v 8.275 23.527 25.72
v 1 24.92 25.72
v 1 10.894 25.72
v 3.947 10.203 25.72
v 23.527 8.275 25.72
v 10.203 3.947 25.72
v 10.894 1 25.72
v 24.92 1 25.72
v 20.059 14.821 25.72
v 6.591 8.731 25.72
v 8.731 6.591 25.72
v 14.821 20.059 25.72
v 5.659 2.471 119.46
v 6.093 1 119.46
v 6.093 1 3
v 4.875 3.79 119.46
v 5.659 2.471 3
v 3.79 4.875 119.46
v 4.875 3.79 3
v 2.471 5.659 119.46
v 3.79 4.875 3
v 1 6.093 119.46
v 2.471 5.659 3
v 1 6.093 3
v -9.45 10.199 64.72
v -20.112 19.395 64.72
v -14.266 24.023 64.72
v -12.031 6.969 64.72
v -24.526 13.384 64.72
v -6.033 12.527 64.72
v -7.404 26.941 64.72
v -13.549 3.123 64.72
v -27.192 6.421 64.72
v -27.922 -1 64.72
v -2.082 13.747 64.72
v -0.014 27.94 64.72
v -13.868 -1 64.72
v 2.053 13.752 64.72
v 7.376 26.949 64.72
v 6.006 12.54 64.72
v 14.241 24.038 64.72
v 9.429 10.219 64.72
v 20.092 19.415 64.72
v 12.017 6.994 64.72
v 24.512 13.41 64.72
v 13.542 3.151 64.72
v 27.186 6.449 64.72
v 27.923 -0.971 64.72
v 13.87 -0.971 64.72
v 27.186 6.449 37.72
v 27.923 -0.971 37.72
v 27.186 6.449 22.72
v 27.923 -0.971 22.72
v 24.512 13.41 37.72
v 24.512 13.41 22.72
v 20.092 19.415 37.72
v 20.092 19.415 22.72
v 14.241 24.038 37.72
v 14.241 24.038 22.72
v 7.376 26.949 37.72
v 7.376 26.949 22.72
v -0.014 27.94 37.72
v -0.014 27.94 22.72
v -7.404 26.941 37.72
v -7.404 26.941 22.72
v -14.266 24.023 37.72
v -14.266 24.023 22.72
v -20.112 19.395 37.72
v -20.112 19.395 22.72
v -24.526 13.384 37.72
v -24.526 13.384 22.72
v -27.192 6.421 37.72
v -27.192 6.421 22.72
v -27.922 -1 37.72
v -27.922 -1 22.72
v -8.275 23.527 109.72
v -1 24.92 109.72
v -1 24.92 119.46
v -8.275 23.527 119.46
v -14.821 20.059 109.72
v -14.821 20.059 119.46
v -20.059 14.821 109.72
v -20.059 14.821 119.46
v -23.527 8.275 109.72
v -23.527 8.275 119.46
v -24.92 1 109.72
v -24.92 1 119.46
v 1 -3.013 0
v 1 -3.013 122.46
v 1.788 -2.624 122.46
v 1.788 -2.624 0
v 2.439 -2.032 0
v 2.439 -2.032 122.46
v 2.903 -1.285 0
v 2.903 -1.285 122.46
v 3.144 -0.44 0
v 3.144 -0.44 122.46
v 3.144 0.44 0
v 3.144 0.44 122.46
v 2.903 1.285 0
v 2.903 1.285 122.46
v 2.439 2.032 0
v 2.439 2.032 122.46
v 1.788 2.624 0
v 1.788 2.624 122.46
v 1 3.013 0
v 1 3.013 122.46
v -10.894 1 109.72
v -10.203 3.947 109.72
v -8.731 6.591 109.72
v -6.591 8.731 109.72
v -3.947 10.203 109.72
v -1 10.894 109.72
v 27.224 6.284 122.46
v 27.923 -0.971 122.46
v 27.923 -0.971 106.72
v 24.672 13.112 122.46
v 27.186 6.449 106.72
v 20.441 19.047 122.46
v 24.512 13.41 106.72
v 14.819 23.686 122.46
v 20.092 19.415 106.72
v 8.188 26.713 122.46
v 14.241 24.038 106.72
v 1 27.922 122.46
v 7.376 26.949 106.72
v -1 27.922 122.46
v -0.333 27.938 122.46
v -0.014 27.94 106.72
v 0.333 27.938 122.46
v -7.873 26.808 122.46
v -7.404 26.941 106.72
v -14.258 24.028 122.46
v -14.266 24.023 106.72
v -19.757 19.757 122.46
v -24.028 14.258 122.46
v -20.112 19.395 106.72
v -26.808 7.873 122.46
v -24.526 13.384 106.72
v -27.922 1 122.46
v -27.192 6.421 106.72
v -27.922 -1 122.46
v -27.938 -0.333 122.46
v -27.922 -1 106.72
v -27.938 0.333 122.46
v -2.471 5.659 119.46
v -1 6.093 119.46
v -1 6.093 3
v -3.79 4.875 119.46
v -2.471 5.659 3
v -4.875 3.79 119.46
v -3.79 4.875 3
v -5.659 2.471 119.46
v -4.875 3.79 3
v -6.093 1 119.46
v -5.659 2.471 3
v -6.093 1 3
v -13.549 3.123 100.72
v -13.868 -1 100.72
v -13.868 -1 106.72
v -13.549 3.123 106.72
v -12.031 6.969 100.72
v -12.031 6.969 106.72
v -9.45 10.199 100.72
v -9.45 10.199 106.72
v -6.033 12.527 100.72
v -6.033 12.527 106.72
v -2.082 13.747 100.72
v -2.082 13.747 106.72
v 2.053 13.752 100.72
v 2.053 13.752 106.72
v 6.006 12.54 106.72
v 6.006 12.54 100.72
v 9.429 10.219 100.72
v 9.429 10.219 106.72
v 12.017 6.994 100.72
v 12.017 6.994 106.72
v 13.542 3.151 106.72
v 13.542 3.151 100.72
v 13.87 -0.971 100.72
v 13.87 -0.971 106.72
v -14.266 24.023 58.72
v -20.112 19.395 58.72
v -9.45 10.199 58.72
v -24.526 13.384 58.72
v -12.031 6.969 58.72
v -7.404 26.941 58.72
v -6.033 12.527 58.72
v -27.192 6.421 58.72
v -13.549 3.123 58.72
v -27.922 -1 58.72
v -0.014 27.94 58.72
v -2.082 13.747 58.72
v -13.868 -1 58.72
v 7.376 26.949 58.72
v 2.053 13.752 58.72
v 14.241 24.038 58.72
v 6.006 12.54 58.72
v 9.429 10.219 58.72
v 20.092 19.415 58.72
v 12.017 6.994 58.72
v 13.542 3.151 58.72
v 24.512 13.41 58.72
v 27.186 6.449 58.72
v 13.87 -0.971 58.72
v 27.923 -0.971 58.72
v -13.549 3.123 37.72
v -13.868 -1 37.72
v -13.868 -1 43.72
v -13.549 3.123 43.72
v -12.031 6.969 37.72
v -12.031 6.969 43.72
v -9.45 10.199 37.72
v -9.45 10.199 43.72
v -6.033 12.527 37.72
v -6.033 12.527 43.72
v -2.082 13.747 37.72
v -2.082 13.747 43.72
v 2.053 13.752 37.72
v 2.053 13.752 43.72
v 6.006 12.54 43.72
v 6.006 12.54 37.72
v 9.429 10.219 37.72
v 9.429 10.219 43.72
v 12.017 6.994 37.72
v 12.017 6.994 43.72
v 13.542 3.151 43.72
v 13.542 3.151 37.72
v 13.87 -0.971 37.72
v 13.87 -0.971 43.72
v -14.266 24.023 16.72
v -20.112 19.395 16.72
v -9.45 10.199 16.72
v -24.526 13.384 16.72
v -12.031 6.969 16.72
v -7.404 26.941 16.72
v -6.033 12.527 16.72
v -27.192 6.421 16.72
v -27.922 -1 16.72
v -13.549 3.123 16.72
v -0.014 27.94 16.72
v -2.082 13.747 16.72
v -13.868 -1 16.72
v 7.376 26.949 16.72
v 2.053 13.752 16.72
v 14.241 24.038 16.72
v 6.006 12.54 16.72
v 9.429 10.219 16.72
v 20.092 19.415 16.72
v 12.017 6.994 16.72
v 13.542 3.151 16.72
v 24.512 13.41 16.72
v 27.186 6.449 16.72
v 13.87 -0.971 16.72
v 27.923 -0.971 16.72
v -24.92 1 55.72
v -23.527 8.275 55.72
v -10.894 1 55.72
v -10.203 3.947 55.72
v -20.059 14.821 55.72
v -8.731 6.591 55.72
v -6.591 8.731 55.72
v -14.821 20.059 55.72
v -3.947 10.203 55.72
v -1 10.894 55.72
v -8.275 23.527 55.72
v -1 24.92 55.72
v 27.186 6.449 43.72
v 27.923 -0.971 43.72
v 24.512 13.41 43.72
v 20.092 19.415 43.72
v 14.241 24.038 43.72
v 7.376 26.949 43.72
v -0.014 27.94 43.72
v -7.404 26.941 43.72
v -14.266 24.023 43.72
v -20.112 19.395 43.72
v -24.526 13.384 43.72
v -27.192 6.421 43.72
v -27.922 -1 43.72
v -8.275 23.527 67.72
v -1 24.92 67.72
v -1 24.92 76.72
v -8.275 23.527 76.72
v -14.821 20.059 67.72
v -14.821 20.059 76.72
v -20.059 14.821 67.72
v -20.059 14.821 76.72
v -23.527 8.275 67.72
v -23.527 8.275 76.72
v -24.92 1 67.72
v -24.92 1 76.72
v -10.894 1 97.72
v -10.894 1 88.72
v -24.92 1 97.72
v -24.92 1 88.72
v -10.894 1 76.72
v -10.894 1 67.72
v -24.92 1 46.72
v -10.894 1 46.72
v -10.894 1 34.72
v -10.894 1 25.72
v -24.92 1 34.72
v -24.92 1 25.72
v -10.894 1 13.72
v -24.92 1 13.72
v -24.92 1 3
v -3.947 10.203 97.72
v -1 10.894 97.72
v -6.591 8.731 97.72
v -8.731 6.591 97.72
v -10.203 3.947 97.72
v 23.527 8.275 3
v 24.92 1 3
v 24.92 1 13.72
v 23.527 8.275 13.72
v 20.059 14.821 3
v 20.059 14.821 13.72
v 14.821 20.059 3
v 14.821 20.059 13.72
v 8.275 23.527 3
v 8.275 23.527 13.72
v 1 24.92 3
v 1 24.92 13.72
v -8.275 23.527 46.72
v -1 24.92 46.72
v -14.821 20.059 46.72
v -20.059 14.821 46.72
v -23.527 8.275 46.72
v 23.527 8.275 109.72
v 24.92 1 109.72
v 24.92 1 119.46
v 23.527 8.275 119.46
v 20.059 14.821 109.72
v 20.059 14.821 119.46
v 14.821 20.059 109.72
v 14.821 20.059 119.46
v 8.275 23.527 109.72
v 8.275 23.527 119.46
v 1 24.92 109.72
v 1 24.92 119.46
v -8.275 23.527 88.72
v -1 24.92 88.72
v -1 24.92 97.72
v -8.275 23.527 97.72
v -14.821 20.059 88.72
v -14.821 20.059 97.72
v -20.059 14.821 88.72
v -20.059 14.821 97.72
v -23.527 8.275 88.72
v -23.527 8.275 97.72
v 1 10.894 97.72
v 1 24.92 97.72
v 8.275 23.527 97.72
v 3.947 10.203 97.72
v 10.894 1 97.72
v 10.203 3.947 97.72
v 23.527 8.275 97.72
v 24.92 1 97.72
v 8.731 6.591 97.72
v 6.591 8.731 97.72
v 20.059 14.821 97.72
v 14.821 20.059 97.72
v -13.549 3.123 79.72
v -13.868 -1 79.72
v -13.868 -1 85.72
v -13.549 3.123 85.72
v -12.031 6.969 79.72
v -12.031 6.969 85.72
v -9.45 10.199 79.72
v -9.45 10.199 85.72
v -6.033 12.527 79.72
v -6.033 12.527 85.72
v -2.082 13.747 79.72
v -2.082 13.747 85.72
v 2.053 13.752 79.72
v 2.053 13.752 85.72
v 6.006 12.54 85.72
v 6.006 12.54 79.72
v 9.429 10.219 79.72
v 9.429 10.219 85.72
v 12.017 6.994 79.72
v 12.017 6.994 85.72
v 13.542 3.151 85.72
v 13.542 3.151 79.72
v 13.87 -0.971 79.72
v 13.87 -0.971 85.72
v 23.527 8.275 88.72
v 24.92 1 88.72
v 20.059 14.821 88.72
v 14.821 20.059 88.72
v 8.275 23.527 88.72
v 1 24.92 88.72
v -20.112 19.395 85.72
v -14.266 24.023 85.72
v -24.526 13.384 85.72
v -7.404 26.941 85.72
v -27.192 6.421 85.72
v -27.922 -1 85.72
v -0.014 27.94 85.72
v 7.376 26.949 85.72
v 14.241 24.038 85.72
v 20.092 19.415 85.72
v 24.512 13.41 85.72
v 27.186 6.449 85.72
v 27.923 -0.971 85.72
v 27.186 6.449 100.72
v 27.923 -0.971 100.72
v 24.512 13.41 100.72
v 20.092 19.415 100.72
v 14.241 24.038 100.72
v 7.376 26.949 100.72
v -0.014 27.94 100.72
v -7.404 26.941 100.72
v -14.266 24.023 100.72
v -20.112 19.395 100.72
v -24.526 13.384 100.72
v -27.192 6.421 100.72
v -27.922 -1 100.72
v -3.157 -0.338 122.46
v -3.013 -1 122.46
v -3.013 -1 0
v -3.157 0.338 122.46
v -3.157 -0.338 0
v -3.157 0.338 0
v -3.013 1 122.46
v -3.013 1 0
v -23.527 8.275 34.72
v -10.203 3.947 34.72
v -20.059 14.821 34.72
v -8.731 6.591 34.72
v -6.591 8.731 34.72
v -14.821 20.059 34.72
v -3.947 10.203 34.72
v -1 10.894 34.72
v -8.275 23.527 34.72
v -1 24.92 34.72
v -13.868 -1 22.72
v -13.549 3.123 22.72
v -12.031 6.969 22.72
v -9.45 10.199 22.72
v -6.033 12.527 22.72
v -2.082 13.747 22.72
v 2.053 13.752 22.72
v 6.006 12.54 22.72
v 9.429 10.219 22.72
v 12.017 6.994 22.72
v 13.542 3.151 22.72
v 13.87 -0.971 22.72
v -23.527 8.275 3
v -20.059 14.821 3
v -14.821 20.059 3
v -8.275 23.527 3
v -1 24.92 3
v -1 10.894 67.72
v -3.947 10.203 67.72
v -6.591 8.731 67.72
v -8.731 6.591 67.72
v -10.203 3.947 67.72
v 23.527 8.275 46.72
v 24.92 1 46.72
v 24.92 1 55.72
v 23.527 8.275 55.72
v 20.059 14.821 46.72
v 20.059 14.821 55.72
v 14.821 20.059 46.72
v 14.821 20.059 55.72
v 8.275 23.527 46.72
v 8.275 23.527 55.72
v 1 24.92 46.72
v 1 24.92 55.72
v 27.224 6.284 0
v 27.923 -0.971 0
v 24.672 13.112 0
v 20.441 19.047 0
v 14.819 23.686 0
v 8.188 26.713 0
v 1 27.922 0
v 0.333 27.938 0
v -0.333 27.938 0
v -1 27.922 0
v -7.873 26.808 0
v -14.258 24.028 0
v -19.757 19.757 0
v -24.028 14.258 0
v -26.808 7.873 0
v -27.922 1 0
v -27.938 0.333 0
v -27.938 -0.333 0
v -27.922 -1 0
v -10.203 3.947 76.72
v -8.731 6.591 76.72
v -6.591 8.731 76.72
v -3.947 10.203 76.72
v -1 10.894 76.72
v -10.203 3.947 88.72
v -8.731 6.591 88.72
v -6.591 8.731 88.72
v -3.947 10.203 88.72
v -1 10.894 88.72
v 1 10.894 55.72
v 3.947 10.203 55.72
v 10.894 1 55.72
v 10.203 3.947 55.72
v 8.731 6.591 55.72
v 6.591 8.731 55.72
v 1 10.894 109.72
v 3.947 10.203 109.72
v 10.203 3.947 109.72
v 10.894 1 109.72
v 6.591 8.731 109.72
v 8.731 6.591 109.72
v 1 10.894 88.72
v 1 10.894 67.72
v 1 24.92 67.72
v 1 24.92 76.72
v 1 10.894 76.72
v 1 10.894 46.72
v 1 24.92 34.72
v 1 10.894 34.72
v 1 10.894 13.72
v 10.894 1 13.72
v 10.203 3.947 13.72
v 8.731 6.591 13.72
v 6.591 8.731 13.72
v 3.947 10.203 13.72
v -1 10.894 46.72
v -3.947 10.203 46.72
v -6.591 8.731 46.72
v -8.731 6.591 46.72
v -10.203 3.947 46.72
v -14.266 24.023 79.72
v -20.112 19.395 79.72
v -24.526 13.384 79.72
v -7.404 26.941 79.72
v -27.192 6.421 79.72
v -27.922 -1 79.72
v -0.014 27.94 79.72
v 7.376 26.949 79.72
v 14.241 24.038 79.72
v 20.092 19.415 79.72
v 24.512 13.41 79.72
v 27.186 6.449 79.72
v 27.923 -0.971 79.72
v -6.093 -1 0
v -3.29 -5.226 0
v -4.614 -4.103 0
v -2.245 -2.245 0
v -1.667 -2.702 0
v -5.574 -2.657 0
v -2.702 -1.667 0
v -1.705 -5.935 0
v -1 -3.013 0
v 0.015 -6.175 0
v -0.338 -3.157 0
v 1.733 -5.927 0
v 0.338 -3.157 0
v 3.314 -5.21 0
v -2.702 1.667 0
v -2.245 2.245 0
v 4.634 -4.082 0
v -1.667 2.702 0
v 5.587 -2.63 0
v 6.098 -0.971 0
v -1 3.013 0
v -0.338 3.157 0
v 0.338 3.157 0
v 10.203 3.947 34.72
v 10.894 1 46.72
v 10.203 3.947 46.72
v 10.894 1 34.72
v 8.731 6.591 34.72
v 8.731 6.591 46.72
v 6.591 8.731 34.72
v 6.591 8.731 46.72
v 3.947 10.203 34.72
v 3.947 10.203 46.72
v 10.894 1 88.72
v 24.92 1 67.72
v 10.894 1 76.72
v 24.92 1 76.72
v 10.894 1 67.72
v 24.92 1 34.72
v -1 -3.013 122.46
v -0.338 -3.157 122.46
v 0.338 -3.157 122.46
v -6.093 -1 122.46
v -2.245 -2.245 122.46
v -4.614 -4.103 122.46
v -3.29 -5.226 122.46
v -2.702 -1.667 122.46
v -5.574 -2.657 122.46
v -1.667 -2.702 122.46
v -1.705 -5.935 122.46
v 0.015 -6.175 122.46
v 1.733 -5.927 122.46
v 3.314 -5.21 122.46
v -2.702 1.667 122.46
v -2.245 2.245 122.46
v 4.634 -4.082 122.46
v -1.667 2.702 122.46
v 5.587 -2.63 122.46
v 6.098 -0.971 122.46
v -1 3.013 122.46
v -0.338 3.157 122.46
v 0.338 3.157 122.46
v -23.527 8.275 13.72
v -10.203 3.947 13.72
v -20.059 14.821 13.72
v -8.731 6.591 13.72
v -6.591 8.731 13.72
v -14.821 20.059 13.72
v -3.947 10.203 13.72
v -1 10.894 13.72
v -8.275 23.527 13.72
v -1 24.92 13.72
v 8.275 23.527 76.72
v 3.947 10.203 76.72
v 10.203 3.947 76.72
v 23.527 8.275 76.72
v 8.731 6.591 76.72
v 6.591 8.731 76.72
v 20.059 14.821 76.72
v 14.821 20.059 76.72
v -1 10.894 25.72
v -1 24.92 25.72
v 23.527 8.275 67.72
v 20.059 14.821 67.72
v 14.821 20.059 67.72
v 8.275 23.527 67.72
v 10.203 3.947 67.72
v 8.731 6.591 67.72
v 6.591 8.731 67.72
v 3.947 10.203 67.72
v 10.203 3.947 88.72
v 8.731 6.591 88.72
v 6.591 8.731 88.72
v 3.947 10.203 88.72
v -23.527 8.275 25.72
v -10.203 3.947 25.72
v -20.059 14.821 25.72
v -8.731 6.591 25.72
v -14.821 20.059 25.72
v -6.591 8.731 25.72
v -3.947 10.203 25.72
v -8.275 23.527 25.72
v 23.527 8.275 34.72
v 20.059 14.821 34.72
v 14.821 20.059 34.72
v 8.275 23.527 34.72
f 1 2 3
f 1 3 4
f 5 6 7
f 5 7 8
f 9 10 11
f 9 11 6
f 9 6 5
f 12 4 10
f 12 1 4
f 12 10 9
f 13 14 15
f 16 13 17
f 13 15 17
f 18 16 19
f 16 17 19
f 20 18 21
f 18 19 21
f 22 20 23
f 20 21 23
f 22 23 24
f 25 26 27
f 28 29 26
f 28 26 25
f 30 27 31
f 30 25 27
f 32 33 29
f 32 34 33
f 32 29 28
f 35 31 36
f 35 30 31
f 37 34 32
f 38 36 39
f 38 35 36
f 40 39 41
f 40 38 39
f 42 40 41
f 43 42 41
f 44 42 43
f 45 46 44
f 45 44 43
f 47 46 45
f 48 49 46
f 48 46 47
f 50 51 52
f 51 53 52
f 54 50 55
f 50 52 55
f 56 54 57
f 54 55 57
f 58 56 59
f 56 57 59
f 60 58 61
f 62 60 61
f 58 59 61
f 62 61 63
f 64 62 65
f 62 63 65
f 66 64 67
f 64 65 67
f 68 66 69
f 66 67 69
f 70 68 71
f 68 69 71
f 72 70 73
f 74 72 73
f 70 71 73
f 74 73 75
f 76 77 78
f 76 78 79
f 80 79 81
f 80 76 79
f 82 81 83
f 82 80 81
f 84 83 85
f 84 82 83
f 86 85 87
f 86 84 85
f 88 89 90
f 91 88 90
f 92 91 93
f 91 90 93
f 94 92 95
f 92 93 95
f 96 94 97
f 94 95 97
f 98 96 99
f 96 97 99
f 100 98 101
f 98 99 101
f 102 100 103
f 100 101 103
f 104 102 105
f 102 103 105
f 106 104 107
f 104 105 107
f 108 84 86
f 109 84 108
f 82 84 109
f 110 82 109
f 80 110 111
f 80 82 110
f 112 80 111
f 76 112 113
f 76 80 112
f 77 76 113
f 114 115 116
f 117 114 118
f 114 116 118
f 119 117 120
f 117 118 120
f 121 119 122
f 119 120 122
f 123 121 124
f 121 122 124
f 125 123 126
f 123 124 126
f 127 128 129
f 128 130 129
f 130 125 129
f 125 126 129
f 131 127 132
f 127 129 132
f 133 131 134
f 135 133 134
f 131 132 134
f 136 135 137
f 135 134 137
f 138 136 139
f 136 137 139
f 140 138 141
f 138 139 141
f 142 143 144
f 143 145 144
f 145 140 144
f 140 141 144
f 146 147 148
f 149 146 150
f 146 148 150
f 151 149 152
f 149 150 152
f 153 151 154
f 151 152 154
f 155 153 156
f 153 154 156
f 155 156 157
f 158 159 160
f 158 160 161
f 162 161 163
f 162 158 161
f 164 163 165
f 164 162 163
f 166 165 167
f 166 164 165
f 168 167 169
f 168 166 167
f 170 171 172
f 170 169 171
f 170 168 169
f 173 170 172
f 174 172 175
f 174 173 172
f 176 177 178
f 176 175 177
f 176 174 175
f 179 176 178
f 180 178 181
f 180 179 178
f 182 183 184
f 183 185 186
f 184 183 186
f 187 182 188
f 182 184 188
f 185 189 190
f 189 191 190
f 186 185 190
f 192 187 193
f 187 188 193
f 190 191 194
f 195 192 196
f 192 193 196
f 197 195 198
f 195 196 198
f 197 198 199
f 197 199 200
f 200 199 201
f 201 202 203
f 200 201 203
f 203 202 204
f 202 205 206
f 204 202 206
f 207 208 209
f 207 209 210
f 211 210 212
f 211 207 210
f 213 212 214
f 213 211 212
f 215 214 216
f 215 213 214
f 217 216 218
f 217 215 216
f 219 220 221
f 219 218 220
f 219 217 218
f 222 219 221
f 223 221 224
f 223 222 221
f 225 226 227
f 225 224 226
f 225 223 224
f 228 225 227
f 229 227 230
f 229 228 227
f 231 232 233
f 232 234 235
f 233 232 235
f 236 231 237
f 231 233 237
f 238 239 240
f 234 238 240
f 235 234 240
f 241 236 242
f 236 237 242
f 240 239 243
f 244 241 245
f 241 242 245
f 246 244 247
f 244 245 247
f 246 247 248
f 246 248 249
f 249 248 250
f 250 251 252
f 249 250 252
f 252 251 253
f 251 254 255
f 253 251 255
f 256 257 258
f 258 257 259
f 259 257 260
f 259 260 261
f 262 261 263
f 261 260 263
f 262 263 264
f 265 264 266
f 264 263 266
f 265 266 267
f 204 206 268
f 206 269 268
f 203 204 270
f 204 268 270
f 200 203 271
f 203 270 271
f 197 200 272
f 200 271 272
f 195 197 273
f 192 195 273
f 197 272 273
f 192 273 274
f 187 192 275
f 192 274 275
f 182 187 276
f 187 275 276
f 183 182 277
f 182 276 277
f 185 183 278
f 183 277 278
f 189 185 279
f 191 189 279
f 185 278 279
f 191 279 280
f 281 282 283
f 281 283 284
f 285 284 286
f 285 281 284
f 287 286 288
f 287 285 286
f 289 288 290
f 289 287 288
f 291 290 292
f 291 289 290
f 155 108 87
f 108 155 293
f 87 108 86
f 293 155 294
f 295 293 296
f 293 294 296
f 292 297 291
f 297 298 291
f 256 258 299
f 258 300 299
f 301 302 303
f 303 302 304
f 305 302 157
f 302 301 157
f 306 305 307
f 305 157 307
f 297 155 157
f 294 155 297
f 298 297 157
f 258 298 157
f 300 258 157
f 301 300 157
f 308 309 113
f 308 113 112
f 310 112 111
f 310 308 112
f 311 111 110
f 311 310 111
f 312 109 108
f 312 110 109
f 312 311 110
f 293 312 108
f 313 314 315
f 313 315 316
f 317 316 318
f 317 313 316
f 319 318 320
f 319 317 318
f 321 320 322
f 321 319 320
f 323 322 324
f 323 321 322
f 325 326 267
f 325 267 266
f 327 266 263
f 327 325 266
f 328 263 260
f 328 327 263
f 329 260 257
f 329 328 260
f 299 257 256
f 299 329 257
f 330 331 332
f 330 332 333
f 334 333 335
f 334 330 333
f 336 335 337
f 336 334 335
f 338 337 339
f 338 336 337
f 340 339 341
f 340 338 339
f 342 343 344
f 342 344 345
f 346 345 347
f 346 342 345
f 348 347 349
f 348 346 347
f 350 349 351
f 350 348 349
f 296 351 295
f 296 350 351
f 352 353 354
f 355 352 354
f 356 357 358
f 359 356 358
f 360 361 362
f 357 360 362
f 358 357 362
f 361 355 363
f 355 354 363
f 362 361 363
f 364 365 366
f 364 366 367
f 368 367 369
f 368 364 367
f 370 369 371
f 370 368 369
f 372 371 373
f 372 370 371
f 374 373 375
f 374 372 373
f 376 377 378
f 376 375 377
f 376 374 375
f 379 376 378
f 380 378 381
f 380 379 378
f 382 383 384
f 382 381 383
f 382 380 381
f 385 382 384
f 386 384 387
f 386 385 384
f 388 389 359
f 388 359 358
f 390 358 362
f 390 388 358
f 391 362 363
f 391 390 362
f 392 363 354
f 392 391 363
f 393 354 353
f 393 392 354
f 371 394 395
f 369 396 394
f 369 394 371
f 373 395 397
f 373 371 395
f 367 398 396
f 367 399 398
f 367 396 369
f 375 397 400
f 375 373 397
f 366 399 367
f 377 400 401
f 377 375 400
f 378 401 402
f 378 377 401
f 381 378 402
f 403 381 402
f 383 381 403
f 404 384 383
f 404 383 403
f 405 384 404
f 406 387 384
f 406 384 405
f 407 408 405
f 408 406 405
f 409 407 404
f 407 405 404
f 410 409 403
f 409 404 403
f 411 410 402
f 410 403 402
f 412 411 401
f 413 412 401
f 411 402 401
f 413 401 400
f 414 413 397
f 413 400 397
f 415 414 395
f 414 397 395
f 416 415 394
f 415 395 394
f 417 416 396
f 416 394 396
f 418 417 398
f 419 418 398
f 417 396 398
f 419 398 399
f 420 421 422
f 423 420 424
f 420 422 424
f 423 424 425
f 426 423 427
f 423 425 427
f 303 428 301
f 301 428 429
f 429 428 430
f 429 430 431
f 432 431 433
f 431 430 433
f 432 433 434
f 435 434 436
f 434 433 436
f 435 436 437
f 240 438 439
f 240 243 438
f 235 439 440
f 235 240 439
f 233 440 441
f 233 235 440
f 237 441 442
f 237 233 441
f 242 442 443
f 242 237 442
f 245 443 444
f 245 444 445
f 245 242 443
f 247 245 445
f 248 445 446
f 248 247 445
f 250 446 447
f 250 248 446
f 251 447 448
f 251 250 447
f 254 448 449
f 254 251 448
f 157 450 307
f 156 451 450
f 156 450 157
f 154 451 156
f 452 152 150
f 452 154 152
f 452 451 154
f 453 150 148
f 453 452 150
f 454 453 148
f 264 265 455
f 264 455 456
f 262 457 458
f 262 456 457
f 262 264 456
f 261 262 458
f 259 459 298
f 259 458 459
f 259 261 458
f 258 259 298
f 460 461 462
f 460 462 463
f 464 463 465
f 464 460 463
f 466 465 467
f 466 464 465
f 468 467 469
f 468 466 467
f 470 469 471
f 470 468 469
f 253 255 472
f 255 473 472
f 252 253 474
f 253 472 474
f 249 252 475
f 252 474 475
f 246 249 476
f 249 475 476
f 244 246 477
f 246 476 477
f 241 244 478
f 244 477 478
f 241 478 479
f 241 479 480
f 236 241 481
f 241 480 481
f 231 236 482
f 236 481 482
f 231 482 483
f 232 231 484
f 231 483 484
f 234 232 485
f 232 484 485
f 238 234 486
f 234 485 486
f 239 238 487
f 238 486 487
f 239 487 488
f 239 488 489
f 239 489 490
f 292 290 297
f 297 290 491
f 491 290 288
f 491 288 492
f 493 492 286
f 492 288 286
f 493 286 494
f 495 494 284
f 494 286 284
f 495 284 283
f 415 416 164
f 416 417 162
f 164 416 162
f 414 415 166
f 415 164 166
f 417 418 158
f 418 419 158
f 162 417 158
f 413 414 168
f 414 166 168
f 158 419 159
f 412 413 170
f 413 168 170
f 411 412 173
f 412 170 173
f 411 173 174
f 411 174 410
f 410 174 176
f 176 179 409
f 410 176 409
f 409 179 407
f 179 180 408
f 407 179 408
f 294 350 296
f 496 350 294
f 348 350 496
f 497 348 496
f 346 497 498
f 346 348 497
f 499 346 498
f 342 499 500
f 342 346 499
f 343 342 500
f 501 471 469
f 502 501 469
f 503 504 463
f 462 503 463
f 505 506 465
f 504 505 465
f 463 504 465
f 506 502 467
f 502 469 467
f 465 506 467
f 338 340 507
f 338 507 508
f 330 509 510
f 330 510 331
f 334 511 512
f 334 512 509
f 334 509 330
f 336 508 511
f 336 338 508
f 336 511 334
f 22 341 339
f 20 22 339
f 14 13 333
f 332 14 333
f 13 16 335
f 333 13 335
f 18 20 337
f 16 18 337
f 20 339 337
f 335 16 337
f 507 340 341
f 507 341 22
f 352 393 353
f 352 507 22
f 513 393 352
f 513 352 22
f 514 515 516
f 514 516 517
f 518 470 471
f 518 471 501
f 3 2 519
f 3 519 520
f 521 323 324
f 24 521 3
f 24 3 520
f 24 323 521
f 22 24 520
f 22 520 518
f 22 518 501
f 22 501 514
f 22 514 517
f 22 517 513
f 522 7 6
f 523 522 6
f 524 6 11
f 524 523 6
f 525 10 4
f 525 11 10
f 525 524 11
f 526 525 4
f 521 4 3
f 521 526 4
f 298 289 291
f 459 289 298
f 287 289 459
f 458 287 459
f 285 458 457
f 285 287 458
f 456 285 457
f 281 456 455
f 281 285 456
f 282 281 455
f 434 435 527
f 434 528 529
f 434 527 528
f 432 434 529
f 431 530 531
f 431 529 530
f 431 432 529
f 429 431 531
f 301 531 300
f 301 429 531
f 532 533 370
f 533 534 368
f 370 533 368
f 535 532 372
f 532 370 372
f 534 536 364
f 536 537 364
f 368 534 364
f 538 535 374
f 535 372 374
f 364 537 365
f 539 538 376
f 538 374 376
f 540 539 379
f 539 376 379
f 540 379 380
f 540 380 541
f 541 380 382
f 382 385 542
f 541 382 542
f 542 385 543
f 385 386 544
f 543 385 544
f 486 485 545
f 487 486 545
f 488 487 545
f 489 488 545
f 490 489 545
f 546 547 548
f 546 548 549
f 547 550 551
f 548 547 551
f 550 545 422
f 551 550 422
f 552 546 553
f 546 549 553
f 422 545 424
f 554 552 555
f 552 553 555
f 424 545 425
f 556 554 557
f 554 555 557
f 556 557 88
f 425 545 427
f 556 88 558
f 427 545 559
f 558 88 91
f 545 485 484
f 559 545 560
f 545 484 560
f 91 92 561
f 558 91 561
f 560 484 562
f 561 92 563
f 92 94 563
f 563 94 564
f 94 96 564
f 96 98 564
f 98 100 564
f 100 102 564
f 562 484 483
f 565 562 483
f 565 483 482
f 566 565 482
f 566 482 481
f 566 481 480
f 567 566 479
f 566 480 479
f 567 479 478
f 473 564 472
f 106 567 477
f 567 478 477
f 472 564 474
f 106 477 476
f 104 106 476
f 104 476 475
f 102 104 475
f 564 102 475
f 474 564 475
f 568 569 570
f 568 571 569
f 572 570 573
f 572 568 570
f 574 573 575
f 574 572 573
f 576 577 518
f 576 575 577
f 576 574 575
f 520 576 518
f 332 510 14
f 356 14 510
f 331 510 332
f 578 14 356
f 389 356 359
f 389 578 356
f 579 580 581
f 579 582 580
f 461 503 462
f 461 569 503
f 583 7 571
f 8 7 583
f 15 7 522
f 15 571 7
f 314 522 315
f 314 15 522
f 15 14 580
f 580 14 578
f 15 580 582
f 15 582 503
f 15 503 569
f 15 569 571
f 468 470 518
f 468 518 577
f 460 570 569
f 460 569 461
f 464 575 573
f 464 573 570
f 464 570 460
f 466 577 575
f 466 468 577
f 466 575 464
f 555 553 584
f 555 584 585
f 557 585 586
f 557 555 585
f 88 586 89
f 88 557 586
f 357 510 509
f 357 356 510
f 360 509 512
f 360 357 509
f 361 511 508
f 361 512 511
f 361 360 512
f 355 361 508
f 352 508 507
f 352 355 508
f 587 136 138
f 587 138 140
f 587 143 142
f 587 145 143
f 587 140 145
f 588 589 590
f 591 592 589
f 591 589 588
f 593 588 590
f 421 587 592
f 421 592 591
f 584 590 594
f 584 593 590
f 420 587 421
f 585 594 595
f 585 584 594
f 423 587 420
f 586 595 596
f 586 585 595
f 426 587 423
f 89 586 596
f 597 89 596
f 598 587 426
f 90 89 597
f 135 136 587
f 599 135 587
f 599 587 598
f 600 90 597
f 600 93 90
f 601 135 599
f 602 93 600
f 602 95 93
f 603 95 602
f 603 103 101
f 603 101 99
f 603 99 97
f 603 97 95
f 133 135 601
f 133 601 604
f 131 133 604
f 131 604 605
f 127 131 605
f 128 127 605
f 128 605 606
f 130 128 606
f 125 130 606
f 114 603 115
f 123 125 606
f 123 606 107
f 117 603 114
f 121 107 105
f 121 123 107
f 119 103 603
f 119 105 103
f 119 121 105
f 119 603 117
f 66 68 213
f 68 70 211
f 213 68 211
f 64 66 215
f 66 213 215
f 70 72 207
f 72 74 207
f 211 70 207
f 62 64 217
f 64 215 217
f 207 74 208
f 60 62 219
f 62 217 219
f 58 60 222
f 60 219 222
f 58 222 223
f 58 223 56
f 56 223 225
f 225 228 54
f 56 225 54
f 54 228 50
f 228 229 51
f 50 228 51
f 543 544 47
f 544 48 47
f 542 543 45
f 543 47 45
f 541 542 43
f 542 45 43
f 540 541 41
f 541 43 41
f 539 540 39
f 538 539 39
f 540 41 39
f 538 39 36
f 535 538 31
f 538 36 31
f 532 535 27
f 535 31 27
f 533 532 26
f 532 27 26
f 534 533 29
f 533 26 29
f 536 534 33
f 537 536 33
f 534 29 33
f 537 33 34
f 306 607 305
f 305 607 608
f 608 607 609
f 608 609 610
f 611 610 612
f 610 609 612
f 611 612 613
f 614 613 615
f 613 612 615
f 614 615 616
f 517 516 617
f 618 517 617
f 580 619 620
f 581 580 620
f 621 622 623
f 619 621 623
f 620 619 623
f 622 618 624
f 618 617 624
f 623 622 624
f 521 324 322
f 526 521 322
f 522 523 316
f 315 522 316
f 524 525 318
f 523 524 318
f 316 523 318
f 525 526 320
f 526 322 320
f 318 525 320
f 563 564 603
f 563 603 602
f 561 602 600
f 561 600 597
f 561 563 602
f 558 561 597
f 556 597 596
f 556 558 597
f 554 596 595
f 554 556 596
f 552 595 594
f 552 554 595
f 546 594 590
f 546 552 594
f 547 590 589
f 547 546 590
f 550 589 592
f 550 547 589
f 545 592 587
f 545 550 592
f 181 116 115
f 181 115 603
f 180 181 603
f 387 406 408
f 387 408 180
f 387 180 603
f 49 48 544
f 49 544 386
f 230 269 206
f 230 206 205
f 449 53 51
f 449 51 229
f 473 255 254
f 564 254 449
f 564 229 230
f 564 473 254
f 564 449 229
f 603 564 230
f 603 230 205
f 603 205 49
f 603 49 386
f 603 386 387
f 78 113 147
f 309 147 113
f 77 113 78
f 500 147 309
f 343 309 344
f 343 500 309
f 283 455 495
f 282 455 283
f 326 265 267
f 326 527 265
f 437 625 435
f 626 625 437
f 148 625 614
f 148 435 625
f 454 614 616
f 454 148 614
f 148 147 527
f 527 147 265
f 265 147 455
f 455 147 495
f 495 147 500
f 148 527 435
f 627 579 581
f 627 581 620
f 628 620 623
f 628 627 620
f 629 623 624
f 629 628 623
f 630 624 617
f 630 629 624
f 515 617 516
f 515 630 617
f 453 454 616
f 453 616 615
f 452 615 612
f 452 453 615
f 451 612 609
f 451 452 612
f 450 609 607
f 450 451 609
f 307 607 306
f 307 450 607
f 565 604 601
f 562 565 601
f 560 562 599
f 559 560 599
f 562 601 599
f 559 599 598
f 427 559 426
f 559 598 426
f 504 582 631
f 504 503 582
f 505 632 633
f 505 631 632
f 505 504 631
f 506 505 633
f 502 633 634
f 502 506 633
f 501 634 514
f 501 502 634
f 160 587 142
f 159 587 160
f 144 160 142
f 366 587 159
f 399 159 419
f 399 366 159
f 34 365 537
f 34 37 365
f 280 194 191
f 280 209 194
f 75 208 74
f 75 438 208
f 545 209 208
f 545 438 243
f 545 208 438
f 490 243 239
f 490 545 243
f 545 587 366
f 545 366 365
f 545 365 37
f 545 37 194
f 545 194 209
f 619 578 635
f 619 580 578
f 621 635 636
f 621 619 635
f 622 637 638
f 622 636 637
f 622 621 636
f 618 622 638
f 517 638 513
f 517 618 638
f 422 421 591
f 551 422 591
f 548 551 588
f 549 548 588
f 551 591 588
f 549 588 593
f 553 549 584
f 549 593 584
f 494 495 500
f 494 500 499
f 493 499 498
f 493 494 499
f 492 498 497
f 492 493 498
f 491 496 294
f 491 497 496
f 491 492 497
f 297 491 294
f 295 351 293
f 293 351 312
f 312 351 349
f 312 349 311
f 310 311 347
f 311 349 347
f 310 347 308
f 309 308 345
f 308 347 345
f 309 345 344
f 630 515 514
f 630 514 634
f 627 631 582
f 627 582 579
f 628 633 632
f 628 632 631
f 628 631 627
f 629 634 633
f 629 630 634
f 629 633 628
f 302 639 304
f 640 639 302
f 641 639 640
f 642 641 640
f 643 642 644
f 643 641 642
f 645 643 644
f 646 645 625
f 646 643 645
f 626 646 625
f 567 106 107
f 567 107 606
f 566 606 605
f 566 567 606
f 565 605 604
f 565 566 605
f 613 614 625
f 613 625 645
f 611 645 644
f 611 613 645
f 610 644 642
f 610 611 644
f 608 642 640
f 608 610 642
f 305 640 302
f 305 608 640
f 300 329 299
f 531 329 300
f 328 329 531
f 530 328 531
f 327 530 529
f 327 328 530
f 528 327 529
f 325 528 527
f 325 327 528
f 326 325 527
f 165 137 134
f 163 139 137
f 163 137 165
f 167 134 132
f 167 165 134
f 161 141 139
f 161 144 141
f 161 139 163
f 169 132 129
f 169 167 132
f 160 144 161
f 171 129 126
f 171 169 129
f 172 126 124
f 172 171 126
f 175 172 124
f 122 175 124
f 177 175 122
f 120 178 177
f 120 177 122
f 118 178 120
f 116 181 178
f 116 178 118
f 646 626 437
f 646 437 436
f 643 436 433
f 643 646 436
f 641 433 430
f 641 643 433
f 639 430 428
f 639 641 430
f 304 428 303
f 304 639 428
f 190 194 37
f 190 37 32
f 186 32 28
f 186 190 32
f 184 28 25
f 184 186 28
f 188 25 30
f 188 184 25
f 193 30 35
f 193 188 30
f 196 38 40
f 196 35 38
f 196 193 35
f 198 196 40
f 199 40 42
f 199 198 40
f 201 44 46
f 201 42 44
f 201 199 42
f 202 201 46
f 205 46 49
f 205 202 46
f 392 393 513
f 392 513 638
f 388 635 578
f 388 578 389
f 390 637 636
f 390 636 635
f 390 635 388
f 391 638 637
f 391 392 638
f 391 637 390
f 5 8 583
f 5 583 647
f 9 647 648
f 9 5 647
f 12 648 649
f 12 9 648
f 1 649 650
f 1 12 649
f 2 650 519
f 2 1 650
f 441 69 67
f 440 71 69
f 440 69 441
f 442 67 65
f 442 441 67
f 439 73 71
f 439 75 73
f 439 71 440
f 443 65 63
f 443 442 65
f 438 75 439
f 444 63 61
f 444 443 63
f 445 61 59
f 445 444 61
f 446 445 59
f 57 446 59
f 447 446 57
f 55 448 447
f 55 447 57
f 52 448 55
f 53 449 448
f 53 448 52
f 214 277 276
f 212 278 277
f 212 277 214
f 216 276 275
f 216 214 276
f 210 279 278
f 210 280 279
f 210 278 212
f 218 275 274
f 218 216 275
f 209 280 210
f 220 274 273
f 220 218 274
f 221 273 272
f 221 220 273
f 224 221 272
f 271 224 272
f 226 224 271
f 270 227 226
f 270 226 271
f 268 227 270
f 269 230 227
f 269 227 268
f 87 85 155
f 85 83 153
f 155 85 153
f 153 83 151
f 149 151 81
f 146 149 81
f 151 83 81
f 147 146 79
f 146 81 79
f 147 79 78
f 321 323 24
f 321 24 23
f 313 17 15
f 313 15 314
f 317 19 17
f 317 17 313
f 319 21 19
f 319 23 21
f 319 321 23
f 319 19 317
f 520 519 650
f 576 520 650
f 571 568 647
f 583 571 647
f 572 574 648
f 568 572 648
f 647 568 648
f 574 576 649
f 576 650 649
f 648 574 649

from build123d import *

# Parameters (mm, degrees)
SKETCH3_R            = 27.94
BOSS_EXTRUDE2_DEPTH  = 122.46
SKETCH5_R            = 3.175
CUT_EXTRUDE1_DEPTH   = 129.676877488
SKETCH4_W            = 14
SKETCH4_H            = 6
SHELL1_START         = 3
SHELL1_OUTLINE_R     = 10.94
SHELL1_OUTLINE_R_2   = 6.175
SHELL1_DEPTH         = 116.46
SHELL1_2_OUTLINE_R   = 24.94
SHELL1_2_OUTLINE_R_2 = 10.94
SHELL1_2_DEPTH       = 10.72
SHELL1_START_2       = 109.72
SHELL1_3_OUTLINE_R   = 24.94
SHELL1_3_OUTLINE_R_2 = 10.94
SHELL1_3_DEPTH       = 9.74
SHELL1_START_3       = 25.72
SHELL1_4_OUTLINE_R   = 24.94
SHELL1_4_OUTLINE_R_2 = 10.94
SHELL1_4_DEPTH       = 9
SHELL1_START_4       = 46.72
SHELL1_5_OUTLINE_R   = 24.94
SHELL1_5_OUTLINE_R_2 = 10.94
SHELL1_5_DEPTH       = 9
SHELL1_START_5       = 67.72
SHELL1_6_OUTLINE_R   = 24.94
SHELL1_6_OUTLINE_R_2 = 10.94
SHELL1_6_DEPTH       = 9
SHELL1_START_6       = 88.72
SHELL1_7_OUTLINE_R   = 24.94
SHELL1_7_OUTLINE_R_2 = 10.94
SHELL1_7_DEPTH       = 9
BOSS_EXTRUDE3_REACH  = 130.677
SKETCH13_W           = 16.483162312
SKETCH13_H           = 6
CUT_EXTRUDE3_DEPTH   = 123


# Read off the part's stored shape, not the designer's step: Shell1
with BuildPart() as part:
    # Sketch3 → Boss-Extrude2 (new body)
    with BuildSketch(Plane.XY):
        Circle(SKETCH3_R)
    extrude(amount=BOSS_EXTRUDE2_DEPTH)

    # Sketch5 → Cut-Extrude1 (cut, through all)
    with BuildSketch(Plane.XY.offset(122.46)):
        Circle(SKETCH5_R)
    extrude(amount=-CUT_EXTRUDE1_DEPTH, mode=Mode.SUBTRACT)

    # Sketch4 → Cut-Revolve1 (revolve, cut)
    with BuildSketch(Plane(origin=(0, 0, 0), x_dir=(1, 0, 0), z_dir=(0, 1, 0)), mode=Mode.PRIVATE) as cut_revolve1_sk:
        with Locations((-20.94, -103.72)):
            Rectangle(SKETCH4_W, SKETCH4_H)
        with Locations((-20.94, -82.72)):
            Rectangle(SKETCH4_W, SKETCH4_H)
        with Locations((-20.94, -61.72)):
            Rectangle(SKETCH4_W, SKETCH4_H)
        with Locations((-20.94, -40.72)):
            Rectangle(SKETCH4_W, SKETCH4_H)
        with Locations((-20.94, -19.72)):
            Rectangle(SKETCH4_W, SKETCH4_H)
    revolve(cut_revolve1_sk.sketch.rotate(Axis((0, 0, 122.46), (0, 0, -1)), 180), axis=Axis((0, 0, 122.46), (0, 0, -1)), mode=Mode.SUBTRACT)

    # Shell1 outline → Shell1 (cut)
    with BuildSketch(Plane.XY.offset(SHELL1_START)):
        Circle(SHELL1_OUTLINE_R)
        Circle(SHELL1_OUTLINE_R_2, mode=Mode.SUBTRACT)
    extrude(amount=SHELL1_DEPTH, mode=Mode.SUBTRACT)

    # Shell1 2 outline → Shell1 2 (cut)
    with BuildSketch(Plane.XY.offset(SHELL1_START)):
        Circle(SHELL1_2_OUTLINE_R)
        Circle(SHELL1_2_OUTLINE_R_2, mode=Mode.SUBTRACT)
    extrude(amount=SHELL1_2_DEPTH, mode=Mode.SUBTRACT)

    # Shell1 3 outline → Shell1 3 (cut)
    with BuildSketch(Plane.XY.offset(SHELL1_START_2)):
        Circle(SHELL1_3_OUTLINE_R)
        Circle(SHELL1_3_OUTLINE_R_2, mode=Mode.SUBTRACT)
    extrude(amount=SHELL1_3_DEPTH, mode=Mode.SUBTRACT)

    # Shell1 4 outline → Shell1 4 (cut)
    with BuildSketch(Plane.XY.offset(SHELL1_START_3)):
        Circle(SHELL1_4_OUTLINE_R)
        Circle(SHELL1_4_OUTLINE_R_2, mode=Mode.SUBTRACT)
    extrude(amount=SHELL1_4_DEPTH, mode=Mode.SUBTRACT)

    # Shell1 5 outline → Shell1 5 (cut)
    with BuildSketch(Plane.XY.offset(SHELL1_START_4)):
        Circle(SHELL1_5_OUTLINE_R)
        Circle(SHELL1_5_OUTLINE_R_2, mode=Mode.SUBTRACT)
    extrude(amount=SHELL1_5_DEPTH, mode=Mode.SUBTRACT)

    # Shell1 6 outline → Shell1 6 (cut)
    with BuildSketch(Plane.XY.offset(SHELL1_START_5)):
        Circle(SHELL1_6_OUTLINE_R)
        Circle(SHELL1_6_OUTLINE_R_2, mode=Mode.SUBTRACT)
    extrude(amount=SHELL1_6_DEPTH, mode=Mode.SUBTRACT)

    # Shell1 7 outline → Shell1 7 (cut)
    with BuildSketch(Plane.XY.offset(SHELL1_START_6)):
        Circle(SHELL1_7_OUTLINE_R)
        Circle(SHELL1_7_OUTLINE_R_2, mode=Mode.SUBTRACT)
    extrude(amount=SHELL1_7_DEPTH, mode=Mode.SUBTRACT)

    # Boss-Extrude3: up to this face of the body (flat: up to its plane)
    boss_extrude3_end = Plane(part.part.faces().sort_by_distance((-27.149737461, 0, 122.46))[0])
    # Sketch10 → Boss-Extrude3 (add, up to the picked face)
    with BuildSketch(Plane(origin=(0, 0, 0), x_dir=(-1, 0, 0), z_dir=(0, 0, -1)), mode=Mode.PRIVATE) as boss_extrude3_sk1:
        with BuildLine():
            Line((-1, 27.922098775), (-1, 3.01340754))
            ThreePointArc((-1, 3.01340754), (0, 3.175), (1, 3.01340754))
            Line((1, 3.01340754), (1, 27.922098775))
            ThreePointArc((1, 27.922098775), (0, 27.94), (-1, 27.922098775))
        make_face()
    boss_extrude3_tool1 = split(extrude(boss_extrude3_sk1.sketch, amount=-BOSS_EXTRUDE3_REACH, mode=Mode.PRIVATE), bisect_by=boss_extrude3_end, keep=Keep.BOTH, mode=Mode.PRIVATE)
    # Sketch10 → Boss-Extrude3 (add, up to the picked face)
    with BuildSketch(Plane(origin=(0, 0, 0), x_dir=(-1, 0, 0), z_dir=(0, 0, -1)), mode=Mode.PRIVATE) as boss_extrude3_sk2:
        with BuildLine():
            Line((3.01340754, 1), (27.922098775, 1))
            ThreePointArc((27.922098775, 1), (27.94, 0), (27.922098775, -1))
            Line((27.922098775, -1), (3.01340754, -1))
            ThreePointArc((3.01340754, -1), (3.175, 0), (3.01340754, 1))
        make_face()
    boss_extrude3_tool2 = split(extrude(boss_extrude3_sk2.sketch, amount=-BOSS_EXTRUDE3_REACH, mode=Mode.PRIVATE), bisect_by=boss_extrude3_end, keep=Keep.BOTH, mode=Mode.PRIVATE)
    # Sketch10 → Boss-Extrude3 (add, up to the picked face)
    with BuildSketch(Plane(origin=(0, 0, 0), x_dir=(-1, 0, 0), z_dir=(0, 0, -1)), mode=Mode.PRIVATE) as boss_extrude3_sk3:
        with BuildLine():
            Line((-1, -3.01340754), (-1, -27.922098775))
            ThreePointArc((-1, -27.922098775), (0, -27.94), (1, -27.922098775))
            Line((1, -27.922098775), (1, -3.01340754))
            ThreePointArc((1, -3.01340754), (0, -3.175), (-1, -3.01340754))
        make_face()
    boss_extrude3_tool3 = split(extrude(boss_extrude3_sk3.sketch, amount=-BOSS_EXTRUDE3_REACH, mode=Mode.PRIVATE), bisect_by=boss_extrude3_end, keep=Keep.BOTH, mode=Mode.PRIVATE)
    # Sketch10 → Boss-Extrude3 (add, up to the picked face)
    with BuildSketch(Plane(origin=(0, 0, 0), x_dir=(-1, 0, 0), z_dir=(0, 0, -1)), mode=Mode.PRIVATE) as boss_extrude3_sk4:
        with BuildLine():
            Line((-27.922098775, -1), (-3.01340754, -1))
            ThreePointArc((-3.01340754, -1), (-3.175, 0), (-3.01340754, 1))
            Line((-3.01340754, 1), (-27.922098775, 1))
            ThreePointArc((-27.922098775, 1), (-27.94, 0), (-27.922098775, -1))
        make_face()
    boss_extrude3_tool4 = split(extrude(boss_extrude3_sk4.sketch, amount=-BOSS_EXTRUDE3_REACH, mode=Mode.PRIVATE), bisect_by=boss_extrude3_end, keep=Keep.BOTH, mode=Mode.PRIVATE)
    add(boss_extrude3_tool1.solids().sort_by(Axis((0, 15.527819, 0), (0, 0, 1)))[0])
    add(boss_extrude3_tool2.solids().sort_by(Axis((-15.527819, 0, 0), (0, 0, 1)))[0])
    add(boss_extrude3_tool3.solids().sort_by(Axis((0, -15.527819, 0), (0, 0, 1)))[0])
    add(boss_extrude3_tool4.solids().sort_by(Axis((15.527819, 0, 0), (0, 0, 1)))[0])

    # Sketch13 → Cut-Revolve2 (revolve, cut)
    with BuildSketch(Plane(origin=(0, 0, 0), x_dir=(1, 0, 0), z_dir=(0, 1, 0)), mode=Mode.PRIVATE) as cut_revolve2_sk:
        with Locations((-22.145666886, -40.72)):
            Rectangle(SKETCH13_W, SKETCH13_H)
        with Locations((-22.145666886, -19.72)):
            Rectangle(SKETCH13_W, SKETCH13_H)
        with Locations((-22.145666886, -61.72)):
            Rectangle(SKETCH13_W, SKETCH13_H)
        with Locations((-22.145666886, -82.72)):
            Rectangle(SKETCH13_W, SKETCH13_H)
        with Locations((-22.145666886, -103.72)):
            Rectangle(SKETCH13_W, SKETCH13_H)
    revolve(cut_revolve2_sk.sketch.rotate(Axis((0, 0, 121.588746248), (0, 0, -1)), 180), axis=Axis((0, 0, 121.588746248), (0, 0, -1)), mode=Mode.SUBTRACT)

    # Sketch16 → Cut-Extrude3 (cut)
    with BuildSketch(Plane(origin=(0, 0, 0), x_dir=(-1, 0, 0), z_dir=(0, 0, -1))):
        with BuildLine():
            Line((-27.923120749, -0.971044624), (-6.098171639, -0.971044624))
            ThreePointArc((-6.098171639, -0.971044624), (-0.014665674, -6.174982584), (6.093490379, -1))
            Line((6.093490379, -1), (27.922098775, -1))
            ThreePointArc((27.922098775, -1), (-0.014486703, -27.939996244), (-27.923120749, -0.971044624))
        make_face()
    extrude(amount=-CUT_EXTRUDE3_DEPTH, mode=Mode.SUBTRACT)


solid = part.part
